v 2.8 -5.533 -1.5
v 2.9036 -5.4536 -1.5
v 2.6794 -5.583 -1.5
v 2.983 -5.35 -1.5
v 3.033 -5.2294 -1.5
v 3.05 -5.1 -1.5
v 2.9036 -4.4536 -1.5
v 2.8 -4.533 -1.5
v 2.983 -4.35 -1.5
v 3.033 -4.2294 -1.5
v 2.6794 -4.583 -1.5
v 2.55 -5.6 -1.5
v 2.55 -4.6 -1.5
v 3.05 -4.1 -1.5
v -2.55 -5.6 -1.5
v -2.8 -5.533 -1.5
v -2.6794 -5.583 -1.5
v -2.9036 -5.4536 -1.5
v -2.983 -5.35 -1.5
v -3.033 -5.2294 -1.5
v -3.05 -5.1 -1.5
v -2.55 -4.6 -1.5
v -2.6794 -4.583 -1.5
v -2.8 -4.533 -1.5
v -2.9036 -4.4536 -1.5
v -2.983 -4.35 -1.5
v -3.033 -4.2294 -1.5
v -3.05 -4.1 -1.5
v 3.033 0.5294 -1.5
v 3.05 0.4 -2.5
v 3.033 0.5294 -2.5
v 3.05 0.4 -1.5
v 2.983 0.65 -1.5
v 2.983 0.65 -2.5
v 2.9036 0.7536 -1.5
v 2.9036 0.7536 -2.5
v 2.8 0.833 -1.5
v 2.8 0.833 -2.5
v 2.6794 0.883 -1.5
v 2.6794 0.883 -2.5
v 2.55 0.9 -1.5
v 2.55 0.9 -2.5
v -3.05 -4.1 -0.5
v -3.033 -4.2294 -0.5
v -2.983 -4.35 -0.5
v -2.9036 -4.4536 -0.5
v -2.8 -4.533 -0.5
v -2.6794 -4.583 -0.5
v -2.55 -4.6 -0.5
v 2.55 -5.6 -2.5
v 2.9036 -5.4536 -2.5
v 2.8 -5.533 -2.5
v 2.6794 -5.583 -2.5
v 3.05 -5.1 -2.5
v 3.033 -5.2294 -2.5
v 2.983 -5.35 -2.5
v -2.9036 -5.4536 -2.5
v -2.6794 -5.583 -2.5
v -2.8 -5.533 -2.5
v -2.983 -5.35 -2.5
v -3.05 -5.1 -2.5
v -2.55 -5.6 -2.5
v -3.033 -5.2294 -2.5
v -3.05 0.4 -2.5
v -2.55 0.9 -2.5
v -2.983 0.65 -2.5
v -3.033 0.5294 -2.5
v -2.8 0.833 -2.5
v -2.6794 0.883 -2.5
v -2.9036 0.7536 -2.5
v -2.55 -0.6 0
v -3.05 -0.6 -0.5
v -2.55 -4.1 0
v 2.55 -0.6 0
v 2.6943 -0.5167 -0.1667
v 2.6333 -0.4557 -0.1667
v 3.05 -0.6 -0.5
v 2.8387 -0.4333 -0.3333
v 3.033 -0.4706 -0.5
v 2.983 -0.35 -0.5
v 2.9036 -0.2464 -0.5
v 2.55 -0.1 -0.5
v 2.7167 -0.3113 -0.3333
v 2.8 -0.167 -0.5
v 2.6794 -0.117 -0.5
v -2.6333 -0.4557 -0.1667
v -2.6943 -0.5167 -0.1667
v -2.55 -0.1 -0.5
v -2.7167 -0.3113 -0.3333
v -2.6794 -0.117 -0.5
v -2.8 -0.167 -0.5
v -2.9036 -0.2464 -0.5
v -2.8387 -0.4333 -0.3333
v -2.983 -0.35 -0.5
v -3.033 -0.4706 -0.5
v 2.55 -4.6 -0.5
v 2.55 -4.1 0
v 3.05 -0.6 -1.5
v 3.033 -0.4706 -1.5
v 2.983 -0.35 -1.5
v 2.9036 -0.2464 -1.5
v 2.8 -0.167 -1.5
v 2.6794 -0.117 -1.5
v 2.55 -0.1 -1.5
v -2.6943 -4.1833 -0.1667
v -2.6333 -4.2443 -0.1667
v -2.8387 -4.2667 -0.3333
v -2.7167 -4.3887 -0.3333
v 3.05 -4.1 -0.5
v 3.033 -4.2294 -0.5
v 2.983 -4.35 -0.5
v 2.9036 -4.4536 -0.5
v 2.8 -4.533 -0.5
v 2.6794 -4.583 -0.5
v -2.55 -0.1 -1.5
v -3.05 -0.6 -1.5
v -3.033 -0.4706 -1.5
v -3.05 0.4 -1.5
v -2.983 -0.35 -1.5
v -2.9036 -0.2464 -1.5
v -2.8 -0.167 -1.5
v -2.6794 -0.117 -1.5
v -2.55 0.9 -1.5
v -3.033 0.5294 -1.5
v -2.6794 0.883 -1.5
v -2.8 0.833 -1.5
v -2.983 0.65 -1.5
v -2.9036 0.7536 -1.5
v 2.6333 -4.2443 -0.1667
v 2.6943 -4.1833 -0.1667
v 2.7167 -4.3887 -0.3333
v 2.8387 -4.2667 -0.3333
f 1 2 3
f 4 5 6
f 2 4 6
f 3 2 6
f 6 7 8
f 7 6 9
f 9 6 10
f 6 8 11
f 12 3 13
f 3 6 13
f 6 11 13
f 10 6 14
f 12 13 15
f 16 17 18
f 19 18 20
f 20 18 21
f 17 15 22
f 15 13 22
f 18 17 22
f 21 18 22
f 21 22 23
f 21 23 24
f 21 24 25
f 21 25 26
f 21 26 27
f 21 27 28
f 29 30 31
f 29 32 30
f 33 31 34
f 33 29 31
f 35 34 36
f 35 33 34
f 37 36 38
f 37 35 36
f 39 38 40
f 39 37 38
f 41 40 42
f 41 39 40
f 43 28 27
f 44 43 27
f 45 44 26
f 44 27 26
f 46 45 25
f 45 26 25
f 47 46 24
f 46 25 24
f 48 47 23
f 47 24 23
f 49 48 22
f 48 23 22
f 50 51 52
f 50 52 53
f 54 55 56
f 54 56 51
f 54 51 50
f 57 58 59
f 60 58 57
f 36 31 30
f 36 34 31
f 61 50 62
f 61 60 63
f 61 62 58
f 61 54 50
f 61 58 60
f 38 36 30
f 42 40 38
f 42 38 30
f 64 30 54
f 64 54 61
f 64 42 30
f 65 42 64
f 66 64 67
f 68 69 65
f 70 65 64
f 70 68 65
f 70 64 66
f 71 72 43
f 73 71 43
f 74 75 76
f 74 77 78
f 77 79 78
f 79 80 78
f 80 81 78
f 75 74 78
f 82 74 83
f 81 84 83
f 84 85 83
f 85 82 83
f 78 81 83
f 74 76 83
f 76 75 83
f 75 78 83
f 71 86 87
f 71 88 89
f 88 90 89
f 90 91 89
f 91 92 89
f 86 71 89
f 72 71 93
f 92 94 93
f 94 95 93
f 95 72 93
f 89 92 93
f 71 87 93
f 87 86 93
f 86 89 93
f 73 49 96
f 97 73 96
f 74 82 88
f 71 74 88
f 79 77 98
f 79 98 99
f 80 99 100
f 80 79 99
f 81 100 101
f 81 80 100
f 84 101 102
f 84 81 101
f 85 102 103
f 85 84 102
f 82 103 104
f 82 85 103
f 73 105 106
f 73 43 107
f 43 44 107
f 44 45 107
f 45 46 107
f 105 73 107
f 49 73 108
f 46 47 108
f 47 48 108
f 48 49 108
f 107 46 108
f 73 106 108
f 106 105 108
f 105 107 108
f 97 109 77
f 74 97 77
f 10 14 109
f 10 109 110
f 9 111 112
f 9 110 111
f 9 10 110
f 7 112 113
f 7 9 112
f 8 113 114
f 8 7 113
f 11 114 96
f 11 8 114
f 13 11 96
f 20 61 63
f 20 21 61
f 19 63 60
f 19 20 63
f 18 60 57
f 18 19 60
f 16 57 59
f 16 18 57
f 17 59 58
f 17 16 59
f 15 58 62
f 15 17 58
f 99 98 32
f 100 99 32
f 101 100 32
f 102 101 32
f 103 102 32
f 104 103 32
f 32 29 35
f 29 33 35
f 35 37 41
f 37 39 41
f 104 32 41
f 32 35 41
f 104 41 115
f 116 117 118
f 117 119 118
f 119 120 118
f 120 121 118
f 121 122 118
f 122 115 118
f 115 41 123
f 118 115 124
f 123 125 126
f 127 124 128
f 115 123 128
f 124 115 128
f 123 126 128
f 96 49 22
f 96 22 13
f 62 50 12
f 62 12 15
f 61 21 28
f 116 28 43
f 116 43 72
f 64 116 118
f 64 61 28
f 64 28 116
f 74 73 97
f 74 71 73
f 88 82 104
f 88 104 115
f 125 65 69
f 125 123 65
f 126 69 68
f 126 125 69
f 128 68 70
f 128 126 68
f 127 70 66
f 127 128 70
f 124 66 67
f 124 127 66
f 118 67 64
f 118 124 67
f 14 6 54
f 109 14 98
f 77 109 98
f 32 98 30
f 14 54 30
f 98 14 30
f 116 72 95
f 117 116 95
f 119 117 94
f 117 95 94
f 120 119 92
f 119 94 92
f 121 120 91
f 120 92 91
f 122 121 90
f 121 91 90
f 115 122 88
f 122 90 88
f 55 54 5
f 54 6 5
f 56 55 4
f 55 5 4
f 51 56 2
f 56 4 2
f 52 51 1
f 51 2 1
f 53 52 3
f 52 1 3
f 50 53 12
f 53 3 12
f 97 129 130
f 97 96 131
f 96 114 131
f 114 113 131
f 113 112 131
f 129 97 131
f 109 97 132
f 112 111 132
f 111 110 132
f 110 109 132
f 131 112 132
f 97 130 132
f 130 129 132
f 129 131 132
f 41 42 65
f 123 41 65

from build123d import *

# Parameters (mm, degrees)
EXTRUDE_1_DEPTH     = 2.5
SKETCH_2_W          = 15.8
SKETCH_2_H          = 6.5
EXTRUDE_2_DEPTH     = 1
FILLET_1_R          = 0.5
CUT_EXTRUDE_1_DEPTH = 12.419391402
SKETCH_4_W          = 21.55935693
SKETCH_4_H          = 12.890776674
SKETCH_4_W_2        = 6.1
SKETCH_4_H_2        = 6.5
CUT_EXTRUDE_2_DEPTH = 10
FILLET_2_R          = 0.5
CHAMFER_1_SIZE      = 0.5


with BuildPart() as part:
    # 草图1 → 凸台-拉伸1 (new body)
    with BuildSketch(Plane.XY):
        with BuildLine():
            Line((-9.05, -1.25), (-9.05, -3.45))
            ThreePointArc((-9.05, -3.45), (-8.713172798, -4.263172798), (-7.9, -4.6))
            Line((-7.9, -4.6), (7.9, -4.6))
            ThreePointArc((7.9, -4.6), (8.713172798, -4.263172798), (9.05, -3.45))
            Line((9.05, -3.45), (9.05, -1.25))
            ThreePointArc((9.05, -1.25), (8.713172798, -0.436827202), (7.9, -0.1))
            Line((7.9, -0.1), (-7.9, -0.1))
            ThreePointArc((-7.9, -0.1), (-8.713172798, -0.436827202), (-9.05, -1.25))
        make_face()
    extrude(amount=-EXTRUDE_1_DEPTH)

    # 草图2 → 凸台-拉伸2 (add)
    with BuildSketch(Plane(origin=(0, 0, -2.5), x_dir=(-1, 0, 0), z_dir=(0, 0, -1))):
        with Locations((0, -2.35)):
            Rectangle(SKETCH_2_W, SKETCH_2_H)
    extrude(amount=-EXTRUDE_2_DEPTH)

    # 圆角1
    fillet_1_edges = [part.edges().sort_by_distance(p)[0] for p in [
        (-7.9, 0.9, -2),
        (-7.9, -5.6, -2),
        (7.9, -5.6, -2),
        (7.9, 0.9, -2),
    ]]
    fillet(fillet_1_edges, radius=FILLET_1_R)

    # 草图3 → 切除-拉伸1 (cut, through all)
    with BuildSketch(Plane(origin=(0, 0.9, 0), x_dir=(1, 0, 0), z_dir=(0, 1, 0))):
        Polygon((8.475, 2.5), (9.05, 1.925), (9.05, 2.5), align=None)
        Polygon((-9.05, 1.925), (-9.05, 2.5), (-8.475, 2.5), align=None)
    extrude(amount=-CUT_EXTRUDE_1_DEPTH, mode=Mode.SUBTRACT)

    # 草图4 → 切除-拉伸2 (cut)
    with BuildSketch(Plane(origin=(0, 0, -2.5), x_dir=(-1, 0, 0), z_dir=(0, 0, -1))):
        with Locations((0, -2.35)):
            Rectangle(SKETCH_4_W, SKETCH_4_H)
        with Locations((0, -2.35)):
            Rectangle(SKETCH_4_W_2, SKETCH_4_H_2, mode=Mode.SUBTRACT)
    extrude(amount=-CUT_EXTRUDE_2_DEPTH, mode=Mode.SUBTRACT)

    # 圆角2
    fillet_2_edges = [part.edges().sort_by_distance(p)[0] for p in [
        (3.05, 0.9, -2),
        (-3.05, 0.9, -2),
        (3.05, -5.6, -2),
        (-3.05, -5.6, -2),
        (-3.05, -0.1, -0.75),
        (-3.05, -4.6, -0.75),
        (3.05, -0.1, -0.75),
        (3.05, -4.6, -0.75),
    ]]
    fillet(fillet_2_edges, radius=FILLET_2_R)

    # 倒角1
    chamfer_1_edges = [part.edges().sort_by_distance(p)[0] for p in [
        (0, -4.6, 0),
        (-3.05, -2.35, 0),
        (0, -0.1, 0),
        (3.05, -2.35, 0),
        (2.903553391, -0.246446609, 0),
        (-2.903553391, -0.246446609, 0),
        (2.903553391, -4.453553391, 0),
        (-2.903553391, -4.453553391, 0),
    ]]
    chamfer(chamfer_1_edges, length=CHAMFER_1_SIZE)


solid = part.part
